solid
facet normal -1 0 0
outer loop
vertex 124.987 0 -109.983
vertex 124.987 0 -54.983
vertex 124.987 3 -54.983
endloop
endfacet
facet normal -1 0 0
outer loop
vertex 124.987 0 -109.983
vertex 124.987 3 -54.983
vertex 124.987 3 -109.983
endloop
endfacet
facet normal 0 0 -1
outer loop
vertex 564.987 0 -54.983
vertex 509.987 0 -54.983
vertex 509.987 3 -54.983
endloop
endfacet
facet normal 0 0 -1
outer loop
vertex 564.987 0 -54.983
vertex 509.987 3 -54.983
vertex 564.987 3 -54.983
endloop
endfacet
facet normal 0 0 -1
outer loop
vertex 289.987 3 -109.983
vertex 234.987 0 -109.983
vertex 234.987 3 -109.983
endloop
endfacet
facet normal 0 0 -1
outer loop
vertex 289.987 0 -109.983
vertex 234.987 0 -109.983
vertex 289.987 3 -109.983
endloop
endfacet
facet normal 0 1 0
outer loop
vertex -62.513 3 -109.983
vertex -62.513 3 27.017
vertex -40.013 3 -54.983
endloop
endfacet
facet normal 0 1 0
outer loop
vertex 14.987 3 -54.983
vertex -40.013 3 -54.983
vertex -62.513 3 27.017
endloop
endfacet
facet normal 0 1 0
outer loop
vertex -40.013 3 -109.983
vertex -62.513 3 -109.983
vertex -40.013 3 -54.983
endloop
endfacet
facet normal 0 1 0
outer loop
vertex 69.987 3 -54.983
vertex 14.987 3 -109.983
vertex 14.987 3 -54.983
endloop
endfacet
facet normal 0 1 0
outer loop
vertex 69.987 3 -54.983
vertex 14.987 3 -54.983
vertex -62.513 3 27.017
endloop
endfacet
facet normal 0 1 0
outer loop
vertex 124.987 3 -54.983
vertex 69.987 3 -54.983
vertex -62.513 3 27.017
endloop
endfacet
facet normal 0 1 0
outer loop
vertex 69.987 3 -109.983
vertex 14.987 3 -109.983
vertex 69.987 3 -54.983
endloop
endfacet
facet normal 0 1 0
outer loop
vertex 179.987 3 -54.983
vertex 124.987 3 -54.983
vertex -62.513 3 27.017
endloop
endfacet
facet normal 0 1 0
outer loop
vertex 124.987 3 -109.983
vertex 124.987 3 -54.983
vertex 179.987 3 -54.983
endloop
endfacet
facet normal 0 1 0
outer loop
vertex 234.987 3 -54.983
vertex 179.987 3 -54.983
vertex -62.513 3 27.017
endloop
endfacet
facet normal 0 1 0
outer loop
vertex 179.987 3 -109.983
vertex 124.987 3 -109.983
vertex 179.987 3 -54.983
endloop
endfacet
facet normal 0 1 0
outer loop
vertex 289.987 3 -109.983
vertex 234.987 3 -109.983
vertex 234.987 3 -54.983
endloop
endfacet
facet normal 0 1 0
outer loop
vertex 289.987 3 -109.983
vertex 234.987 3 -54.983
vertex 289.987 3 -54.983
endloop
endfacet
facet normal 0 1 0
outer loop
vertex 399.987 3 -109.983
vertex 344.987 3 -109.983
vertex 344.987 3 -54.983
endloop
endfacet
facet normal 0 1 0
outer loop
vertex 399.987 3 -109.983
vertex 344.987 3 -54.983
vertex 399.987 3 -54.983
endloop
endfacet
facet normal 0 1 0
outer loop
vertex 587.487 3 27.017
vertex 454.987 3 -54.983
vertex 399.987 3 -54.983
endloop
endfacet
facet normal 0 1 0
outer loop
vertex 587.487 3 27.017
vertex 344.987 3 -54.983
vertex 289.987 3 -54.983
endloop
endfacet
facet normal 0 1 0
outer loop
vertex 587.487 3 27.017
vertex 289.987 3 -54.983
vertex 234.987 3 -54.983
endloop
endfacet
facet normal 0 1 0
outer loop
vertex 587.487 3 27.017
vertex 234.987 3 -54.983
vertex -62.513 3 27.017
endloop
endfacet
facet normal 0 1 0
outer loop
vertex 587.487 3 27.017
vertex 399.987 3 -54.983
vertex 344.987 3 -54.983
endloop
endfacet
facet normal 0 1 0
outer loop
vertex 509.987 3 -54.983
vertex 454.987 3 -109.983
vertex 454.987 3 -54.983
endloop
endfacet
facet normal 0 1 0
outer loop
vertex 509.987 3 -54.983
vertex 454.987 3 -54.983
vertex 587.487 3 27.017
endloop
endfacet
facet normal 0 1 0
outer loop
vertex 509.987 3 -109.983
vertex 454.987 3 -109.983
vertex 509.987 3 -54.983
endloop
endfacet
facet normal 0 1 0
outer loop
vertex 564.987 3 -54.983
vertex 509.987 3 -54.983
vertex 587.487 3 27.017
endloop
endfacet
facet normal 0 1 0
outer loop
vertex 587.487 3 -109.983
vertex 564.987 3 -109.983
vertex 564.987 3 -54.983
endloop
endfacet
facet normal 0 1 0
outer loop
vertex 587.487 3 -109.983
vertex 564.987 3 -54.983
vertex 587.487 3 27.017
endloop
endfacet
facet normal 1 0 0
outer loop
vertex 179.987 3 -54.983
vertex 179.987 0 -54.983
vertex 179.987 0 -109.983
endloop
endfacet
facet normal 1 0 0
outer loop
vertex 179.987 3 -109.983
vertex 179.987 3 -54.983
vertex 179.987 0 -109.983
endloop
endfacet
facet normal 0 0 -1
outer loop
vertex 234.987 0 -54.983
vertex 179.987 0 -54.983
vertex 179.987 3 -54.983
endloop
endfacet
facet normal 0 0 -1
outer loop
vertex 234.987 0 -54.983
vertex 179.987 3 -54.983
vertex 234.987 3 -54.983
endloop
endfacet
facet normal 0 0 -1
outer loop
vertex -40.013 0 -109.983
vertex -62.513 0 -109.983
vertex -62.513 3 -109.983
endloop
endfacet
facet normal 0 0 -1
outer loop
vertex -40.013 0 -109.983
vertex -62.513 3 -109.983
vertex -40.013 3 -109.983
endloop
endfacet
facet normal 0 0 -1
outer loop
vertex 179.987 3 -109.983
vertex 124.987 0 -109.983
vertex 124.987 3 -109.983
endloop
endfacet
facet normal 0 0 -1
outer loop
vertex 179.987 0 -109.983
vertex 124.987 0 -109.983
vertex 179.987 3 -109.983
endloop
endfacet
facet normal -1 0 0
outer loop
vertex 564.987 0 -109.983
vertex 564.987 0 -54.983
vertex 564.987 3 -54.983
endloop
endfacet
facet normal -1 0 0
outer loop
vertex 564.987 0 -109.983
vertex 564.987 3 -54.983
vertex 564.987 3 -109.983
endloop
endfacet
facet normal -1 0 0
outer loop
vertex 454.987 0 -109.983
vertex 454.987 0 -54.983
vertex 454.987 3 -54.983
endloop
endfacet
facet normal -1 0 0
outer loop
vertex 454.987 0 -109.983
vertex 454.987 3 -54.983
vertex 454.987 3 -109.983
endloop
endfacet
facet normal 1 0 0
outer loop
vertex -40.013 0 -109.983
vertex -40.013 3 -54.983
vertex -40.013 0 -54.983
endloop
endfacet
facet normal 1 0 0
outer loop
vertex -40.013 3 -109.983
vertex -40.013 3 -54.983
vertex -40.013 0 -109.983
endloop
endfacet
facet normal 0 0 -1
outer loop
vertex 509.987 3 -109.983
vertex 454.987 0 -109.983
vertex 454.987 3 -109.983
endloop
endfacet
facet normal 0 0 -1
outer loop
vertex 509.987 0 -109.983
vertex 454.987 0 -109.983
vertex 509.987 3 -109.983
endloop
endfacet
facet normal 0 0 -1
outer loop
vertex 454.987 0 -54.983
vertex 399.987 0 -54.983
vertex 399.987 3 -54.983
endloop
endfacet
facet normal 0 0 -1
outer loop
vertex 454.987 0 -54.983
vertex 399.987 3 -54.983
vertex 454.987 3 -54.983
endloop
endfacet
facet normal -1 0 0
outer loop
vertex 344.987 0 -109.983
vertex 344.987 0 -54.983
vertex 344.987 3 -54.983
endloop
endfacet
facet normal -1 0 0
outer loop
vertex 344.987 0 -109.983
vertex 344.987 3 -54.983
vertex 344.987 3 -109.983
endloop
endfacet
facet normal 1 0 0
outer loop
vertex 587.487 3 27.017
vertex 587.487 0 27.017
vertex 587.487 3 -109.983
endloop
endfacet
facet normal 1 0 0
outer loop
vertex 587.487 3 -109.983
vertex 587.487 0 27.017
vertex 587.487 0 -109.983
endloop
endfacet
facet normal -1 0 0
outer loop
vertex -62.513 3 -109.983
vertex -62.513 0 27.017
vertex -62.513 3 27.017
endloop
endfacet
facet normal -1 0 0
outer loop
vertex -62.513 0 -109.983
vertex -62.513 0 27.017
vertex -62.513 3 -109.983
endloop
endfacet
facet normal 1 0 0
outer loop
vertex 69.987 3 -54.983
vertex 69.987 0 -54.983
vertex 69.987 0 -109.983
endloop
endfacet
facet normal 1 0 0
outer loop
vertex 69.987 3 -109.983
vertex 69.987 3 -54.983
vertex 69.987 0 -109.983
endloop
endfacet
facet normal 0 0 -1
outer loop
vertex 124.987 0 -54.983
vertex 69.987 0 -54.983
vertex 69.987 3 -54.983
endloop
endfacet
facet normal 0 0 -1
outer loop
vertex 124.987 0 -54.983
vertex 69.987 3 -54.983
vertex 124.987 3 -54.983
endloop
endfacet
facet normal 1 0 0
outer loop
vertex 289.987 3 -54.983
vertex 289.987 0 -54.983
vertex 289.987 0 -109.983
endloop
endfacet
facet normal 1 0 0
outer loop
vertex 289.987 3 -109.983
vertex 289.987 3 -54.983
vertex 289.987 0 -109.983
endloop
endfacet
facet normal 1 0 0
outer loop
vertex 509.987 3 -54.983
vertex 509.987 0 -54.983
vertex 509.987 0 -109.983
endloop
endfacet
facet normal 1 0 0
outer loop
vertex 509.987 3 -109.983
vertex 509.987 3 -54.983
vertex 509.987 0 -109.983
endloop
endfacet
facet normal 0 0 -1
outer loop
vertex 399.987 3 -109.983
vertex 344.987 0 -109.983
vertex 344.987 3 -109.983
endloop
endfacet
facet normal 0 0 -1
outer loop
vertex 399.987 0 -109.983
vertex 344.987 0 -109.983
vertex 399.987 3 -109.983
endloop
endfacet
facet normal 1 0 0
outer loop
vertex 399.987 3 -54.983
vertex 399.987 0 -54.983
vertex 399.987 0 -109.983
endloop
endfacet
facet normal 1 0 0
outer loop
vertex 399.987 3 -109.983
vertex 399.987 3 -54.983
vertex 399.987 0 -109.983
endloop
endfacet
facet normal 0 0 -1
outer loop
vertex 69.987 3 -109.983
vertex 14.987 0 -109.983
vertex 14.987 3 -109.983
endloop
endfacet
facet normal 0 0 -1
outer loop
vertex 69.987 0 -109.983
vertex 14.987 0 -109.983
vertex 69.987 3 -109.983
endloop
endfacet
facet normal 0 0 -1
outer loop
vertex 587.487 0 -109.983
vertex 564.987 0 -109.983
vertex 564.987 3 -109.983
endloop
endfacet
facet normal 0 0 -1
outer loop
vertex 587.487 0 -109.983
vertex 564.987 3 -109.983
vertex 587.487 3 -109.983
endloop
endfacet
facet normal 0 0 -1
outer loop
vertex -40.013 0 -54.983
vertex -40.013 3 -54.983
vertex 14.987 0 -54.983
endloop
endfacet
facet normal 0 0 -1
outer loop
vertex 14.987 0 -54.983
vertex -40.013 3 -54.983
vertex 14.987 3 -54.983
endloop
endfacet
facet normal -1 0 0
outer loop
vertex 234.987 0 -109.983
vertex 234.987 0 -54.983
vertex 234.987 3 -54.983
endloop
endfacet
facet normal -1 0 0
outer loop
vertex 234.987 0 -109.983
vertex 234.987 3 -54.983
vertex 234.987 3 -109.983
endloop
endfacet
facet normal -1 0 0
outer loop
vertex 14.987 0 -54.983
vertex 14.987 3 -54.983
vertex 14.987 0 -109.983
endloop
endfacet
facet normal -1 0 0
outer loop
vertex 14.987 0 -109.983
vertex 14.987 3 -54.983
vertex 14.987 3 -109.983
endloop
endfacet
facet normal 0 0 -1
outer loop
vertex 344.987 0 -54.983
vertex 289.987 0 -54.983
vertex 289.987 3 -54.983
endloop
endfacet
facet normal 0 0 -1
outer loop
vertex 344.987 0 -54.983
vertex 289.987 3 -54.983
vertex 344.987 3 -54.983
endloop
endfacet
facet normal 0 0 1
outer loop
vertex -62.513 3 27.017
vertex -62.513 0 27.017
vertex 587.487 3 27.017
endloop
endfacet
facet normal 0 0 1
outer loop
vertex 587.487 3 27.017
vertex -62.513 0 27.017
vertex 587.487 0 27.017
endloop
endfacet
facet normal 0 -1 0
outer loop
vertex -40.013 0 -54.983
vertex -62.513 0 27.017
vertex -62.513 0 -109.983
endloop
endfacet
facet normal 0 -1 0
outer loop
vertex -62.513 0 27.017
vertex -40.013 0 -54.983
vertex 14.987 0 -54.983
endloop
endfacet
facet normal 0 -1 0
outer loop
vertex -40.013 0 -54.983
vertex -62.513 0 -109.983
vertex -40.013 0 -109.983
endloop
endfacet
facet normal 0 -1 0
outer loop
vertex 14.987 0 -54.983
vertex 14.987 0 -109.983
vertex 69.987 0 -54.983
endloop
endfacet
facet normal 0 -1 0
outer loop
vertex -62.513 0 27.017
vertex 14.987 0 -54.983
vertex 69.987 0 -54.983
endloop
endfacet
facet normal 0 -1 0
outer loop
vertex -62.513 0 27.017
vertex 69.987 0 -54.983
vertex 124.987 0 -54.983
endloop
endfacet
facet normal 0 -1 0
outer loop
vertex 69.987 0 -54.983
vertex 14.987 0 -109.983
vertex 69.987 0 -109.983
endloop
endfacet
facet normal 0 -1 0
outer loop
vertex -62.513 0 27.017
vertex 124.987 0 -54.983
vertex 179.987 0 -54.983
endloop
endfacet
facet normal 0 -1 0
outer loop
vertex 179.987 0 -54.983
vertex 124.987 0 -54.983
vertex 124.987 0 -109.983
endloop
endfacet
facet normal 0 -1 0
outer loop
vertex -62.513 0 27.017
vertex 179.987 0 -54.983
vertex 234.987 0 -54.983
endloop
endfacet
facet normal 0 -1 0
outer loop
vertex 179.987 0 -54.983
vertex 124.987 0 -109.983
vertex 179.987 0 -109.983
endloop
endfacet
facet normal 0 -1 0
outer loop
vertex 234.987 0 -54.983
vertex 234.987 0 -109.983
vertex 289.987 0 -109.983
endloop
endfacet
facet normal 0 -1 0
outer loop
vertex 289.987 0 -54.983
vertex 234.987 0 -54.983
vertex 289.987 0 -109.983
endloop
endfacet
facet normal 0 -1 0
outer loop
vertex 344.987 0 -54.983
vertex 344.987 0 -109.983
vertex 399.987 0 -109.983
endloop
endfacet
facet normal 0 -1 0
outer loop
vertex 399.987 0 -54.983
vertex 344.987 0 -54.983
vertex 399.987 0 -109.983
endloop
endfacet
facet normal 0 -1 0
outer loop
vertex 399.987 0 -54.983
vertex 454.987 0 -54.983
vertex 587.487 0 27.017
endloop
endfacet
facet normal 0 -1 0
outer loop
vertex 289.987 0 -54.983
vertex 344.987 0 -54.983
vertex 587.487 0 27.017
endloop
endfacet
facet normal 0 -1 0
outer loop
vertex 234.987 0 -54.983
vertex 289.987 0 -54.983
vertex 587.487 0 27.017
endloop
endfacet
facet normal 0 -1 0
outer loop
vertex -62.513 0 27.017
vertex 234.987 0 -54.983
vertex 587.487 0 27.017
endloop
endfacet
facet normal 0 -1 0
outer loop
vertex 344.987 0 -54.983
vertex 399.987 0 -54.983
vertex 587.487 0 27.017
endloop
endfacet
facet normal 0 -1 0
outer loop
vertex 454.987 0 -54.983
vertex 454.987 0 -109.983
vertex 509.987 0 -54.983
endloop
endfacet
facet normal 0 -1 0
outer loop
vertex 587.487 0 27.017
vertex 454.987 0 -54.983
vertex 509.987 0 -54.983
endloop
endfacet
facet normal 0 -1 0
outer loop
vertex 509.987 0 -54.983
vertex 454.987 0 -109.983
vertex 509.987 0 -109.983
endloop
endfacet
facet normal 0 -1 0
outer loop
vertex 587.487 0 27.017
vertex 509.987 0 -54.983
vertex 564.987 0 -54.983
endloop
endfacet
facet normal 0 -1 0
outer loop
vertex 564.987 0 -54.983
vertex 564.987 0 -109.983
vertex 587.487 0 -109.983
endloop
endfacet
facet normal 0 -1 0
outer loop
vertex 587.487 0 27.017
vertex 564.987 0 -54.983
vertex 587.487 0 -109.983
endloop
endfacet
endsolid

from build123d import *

# Parameters (mm, degrees)
SKETCH1_W               = 650
SKETCH1_H               = 137
BOSS_EXTRUDE1_DEPTH     = 3
CUT_EXTRUDE2_DEPTH      = 598.701122593
CUT_EXTRUDE2_DEPTH_BACK = 598.701122593
SKETCH2_W               = 55
SKETCH2_H               = 55
SKETCH3_W               = 55
SKETCH3_H               = 55
CUT_EXTRUDE3_DEPTH      = 598.701122593


with BuildPart() as part:
    # Sketch1 → Boss-Extrude1 (new body)
    with BuildSketch(Plane(origin=(0, 0, 0), x_dir=(1, 0, 0), z_dir=(0, 1, 0))):
        with Locations((262.487315064, 41.483119558)):
            Rectangle(SKETCH1_W, SKETCH1_H)
    extrude(amount=BOSS_EXTRUDE1_DEPTH)

    # Sketch2 → Cut-Extrude2 (cut, two sides: drawn at the far end of the back side and taken through both)
    with BuildSketch(Plane(origin=(0, 0, 0), x_dir=(1, 0, 0), z_dir=(0, 1, 0)).offset(-CUT_EXTRUDE2_DEPTH_BACK)):
        with Locations((97.487315064, 82.483119558)):
            Rectangle(SKETCH2_W, SKETCH2_H)
        with Locations((207.487315064, 82.483119558)):
            Rectangle(SKETCH2_W, SKETCH2_H)
        with Locations((317.487315064, 82.483119558)):
            Rectangle(SKETCH2_W, SKETCH2_H)
        with Locations((427.487315064, 82.483119558)):
            Rectangle(SKETCH2_W, SKETCH2_H)
        with Locations((537.487315064, 82.483119558)):
            Rectangle(SKETCH2_W, SKETCH2_H)
    extrude(amount=CUT_EXTRUDE2_DEPTH + CUT_EXTRUDE2_DEPTH_BACK, mode=Mode.SUBTRACT)

    # Sketch3 → Cut-Extrude3 (cut, through all)
    with BuildSketch(Plane(origin=(0, 3, 0), x_dir=(1, 0, 0), z_dir=(0, 1, 0))):
        with Locations((-12.512684936, 82.483119558)):
            Rectangle(SKETCH3_W, SKETCH3_H)
    extrude(amount=-CUT_EXTRUDE3_DEPTH, mode=Mode.SUBTRACT)


solid = part.part
